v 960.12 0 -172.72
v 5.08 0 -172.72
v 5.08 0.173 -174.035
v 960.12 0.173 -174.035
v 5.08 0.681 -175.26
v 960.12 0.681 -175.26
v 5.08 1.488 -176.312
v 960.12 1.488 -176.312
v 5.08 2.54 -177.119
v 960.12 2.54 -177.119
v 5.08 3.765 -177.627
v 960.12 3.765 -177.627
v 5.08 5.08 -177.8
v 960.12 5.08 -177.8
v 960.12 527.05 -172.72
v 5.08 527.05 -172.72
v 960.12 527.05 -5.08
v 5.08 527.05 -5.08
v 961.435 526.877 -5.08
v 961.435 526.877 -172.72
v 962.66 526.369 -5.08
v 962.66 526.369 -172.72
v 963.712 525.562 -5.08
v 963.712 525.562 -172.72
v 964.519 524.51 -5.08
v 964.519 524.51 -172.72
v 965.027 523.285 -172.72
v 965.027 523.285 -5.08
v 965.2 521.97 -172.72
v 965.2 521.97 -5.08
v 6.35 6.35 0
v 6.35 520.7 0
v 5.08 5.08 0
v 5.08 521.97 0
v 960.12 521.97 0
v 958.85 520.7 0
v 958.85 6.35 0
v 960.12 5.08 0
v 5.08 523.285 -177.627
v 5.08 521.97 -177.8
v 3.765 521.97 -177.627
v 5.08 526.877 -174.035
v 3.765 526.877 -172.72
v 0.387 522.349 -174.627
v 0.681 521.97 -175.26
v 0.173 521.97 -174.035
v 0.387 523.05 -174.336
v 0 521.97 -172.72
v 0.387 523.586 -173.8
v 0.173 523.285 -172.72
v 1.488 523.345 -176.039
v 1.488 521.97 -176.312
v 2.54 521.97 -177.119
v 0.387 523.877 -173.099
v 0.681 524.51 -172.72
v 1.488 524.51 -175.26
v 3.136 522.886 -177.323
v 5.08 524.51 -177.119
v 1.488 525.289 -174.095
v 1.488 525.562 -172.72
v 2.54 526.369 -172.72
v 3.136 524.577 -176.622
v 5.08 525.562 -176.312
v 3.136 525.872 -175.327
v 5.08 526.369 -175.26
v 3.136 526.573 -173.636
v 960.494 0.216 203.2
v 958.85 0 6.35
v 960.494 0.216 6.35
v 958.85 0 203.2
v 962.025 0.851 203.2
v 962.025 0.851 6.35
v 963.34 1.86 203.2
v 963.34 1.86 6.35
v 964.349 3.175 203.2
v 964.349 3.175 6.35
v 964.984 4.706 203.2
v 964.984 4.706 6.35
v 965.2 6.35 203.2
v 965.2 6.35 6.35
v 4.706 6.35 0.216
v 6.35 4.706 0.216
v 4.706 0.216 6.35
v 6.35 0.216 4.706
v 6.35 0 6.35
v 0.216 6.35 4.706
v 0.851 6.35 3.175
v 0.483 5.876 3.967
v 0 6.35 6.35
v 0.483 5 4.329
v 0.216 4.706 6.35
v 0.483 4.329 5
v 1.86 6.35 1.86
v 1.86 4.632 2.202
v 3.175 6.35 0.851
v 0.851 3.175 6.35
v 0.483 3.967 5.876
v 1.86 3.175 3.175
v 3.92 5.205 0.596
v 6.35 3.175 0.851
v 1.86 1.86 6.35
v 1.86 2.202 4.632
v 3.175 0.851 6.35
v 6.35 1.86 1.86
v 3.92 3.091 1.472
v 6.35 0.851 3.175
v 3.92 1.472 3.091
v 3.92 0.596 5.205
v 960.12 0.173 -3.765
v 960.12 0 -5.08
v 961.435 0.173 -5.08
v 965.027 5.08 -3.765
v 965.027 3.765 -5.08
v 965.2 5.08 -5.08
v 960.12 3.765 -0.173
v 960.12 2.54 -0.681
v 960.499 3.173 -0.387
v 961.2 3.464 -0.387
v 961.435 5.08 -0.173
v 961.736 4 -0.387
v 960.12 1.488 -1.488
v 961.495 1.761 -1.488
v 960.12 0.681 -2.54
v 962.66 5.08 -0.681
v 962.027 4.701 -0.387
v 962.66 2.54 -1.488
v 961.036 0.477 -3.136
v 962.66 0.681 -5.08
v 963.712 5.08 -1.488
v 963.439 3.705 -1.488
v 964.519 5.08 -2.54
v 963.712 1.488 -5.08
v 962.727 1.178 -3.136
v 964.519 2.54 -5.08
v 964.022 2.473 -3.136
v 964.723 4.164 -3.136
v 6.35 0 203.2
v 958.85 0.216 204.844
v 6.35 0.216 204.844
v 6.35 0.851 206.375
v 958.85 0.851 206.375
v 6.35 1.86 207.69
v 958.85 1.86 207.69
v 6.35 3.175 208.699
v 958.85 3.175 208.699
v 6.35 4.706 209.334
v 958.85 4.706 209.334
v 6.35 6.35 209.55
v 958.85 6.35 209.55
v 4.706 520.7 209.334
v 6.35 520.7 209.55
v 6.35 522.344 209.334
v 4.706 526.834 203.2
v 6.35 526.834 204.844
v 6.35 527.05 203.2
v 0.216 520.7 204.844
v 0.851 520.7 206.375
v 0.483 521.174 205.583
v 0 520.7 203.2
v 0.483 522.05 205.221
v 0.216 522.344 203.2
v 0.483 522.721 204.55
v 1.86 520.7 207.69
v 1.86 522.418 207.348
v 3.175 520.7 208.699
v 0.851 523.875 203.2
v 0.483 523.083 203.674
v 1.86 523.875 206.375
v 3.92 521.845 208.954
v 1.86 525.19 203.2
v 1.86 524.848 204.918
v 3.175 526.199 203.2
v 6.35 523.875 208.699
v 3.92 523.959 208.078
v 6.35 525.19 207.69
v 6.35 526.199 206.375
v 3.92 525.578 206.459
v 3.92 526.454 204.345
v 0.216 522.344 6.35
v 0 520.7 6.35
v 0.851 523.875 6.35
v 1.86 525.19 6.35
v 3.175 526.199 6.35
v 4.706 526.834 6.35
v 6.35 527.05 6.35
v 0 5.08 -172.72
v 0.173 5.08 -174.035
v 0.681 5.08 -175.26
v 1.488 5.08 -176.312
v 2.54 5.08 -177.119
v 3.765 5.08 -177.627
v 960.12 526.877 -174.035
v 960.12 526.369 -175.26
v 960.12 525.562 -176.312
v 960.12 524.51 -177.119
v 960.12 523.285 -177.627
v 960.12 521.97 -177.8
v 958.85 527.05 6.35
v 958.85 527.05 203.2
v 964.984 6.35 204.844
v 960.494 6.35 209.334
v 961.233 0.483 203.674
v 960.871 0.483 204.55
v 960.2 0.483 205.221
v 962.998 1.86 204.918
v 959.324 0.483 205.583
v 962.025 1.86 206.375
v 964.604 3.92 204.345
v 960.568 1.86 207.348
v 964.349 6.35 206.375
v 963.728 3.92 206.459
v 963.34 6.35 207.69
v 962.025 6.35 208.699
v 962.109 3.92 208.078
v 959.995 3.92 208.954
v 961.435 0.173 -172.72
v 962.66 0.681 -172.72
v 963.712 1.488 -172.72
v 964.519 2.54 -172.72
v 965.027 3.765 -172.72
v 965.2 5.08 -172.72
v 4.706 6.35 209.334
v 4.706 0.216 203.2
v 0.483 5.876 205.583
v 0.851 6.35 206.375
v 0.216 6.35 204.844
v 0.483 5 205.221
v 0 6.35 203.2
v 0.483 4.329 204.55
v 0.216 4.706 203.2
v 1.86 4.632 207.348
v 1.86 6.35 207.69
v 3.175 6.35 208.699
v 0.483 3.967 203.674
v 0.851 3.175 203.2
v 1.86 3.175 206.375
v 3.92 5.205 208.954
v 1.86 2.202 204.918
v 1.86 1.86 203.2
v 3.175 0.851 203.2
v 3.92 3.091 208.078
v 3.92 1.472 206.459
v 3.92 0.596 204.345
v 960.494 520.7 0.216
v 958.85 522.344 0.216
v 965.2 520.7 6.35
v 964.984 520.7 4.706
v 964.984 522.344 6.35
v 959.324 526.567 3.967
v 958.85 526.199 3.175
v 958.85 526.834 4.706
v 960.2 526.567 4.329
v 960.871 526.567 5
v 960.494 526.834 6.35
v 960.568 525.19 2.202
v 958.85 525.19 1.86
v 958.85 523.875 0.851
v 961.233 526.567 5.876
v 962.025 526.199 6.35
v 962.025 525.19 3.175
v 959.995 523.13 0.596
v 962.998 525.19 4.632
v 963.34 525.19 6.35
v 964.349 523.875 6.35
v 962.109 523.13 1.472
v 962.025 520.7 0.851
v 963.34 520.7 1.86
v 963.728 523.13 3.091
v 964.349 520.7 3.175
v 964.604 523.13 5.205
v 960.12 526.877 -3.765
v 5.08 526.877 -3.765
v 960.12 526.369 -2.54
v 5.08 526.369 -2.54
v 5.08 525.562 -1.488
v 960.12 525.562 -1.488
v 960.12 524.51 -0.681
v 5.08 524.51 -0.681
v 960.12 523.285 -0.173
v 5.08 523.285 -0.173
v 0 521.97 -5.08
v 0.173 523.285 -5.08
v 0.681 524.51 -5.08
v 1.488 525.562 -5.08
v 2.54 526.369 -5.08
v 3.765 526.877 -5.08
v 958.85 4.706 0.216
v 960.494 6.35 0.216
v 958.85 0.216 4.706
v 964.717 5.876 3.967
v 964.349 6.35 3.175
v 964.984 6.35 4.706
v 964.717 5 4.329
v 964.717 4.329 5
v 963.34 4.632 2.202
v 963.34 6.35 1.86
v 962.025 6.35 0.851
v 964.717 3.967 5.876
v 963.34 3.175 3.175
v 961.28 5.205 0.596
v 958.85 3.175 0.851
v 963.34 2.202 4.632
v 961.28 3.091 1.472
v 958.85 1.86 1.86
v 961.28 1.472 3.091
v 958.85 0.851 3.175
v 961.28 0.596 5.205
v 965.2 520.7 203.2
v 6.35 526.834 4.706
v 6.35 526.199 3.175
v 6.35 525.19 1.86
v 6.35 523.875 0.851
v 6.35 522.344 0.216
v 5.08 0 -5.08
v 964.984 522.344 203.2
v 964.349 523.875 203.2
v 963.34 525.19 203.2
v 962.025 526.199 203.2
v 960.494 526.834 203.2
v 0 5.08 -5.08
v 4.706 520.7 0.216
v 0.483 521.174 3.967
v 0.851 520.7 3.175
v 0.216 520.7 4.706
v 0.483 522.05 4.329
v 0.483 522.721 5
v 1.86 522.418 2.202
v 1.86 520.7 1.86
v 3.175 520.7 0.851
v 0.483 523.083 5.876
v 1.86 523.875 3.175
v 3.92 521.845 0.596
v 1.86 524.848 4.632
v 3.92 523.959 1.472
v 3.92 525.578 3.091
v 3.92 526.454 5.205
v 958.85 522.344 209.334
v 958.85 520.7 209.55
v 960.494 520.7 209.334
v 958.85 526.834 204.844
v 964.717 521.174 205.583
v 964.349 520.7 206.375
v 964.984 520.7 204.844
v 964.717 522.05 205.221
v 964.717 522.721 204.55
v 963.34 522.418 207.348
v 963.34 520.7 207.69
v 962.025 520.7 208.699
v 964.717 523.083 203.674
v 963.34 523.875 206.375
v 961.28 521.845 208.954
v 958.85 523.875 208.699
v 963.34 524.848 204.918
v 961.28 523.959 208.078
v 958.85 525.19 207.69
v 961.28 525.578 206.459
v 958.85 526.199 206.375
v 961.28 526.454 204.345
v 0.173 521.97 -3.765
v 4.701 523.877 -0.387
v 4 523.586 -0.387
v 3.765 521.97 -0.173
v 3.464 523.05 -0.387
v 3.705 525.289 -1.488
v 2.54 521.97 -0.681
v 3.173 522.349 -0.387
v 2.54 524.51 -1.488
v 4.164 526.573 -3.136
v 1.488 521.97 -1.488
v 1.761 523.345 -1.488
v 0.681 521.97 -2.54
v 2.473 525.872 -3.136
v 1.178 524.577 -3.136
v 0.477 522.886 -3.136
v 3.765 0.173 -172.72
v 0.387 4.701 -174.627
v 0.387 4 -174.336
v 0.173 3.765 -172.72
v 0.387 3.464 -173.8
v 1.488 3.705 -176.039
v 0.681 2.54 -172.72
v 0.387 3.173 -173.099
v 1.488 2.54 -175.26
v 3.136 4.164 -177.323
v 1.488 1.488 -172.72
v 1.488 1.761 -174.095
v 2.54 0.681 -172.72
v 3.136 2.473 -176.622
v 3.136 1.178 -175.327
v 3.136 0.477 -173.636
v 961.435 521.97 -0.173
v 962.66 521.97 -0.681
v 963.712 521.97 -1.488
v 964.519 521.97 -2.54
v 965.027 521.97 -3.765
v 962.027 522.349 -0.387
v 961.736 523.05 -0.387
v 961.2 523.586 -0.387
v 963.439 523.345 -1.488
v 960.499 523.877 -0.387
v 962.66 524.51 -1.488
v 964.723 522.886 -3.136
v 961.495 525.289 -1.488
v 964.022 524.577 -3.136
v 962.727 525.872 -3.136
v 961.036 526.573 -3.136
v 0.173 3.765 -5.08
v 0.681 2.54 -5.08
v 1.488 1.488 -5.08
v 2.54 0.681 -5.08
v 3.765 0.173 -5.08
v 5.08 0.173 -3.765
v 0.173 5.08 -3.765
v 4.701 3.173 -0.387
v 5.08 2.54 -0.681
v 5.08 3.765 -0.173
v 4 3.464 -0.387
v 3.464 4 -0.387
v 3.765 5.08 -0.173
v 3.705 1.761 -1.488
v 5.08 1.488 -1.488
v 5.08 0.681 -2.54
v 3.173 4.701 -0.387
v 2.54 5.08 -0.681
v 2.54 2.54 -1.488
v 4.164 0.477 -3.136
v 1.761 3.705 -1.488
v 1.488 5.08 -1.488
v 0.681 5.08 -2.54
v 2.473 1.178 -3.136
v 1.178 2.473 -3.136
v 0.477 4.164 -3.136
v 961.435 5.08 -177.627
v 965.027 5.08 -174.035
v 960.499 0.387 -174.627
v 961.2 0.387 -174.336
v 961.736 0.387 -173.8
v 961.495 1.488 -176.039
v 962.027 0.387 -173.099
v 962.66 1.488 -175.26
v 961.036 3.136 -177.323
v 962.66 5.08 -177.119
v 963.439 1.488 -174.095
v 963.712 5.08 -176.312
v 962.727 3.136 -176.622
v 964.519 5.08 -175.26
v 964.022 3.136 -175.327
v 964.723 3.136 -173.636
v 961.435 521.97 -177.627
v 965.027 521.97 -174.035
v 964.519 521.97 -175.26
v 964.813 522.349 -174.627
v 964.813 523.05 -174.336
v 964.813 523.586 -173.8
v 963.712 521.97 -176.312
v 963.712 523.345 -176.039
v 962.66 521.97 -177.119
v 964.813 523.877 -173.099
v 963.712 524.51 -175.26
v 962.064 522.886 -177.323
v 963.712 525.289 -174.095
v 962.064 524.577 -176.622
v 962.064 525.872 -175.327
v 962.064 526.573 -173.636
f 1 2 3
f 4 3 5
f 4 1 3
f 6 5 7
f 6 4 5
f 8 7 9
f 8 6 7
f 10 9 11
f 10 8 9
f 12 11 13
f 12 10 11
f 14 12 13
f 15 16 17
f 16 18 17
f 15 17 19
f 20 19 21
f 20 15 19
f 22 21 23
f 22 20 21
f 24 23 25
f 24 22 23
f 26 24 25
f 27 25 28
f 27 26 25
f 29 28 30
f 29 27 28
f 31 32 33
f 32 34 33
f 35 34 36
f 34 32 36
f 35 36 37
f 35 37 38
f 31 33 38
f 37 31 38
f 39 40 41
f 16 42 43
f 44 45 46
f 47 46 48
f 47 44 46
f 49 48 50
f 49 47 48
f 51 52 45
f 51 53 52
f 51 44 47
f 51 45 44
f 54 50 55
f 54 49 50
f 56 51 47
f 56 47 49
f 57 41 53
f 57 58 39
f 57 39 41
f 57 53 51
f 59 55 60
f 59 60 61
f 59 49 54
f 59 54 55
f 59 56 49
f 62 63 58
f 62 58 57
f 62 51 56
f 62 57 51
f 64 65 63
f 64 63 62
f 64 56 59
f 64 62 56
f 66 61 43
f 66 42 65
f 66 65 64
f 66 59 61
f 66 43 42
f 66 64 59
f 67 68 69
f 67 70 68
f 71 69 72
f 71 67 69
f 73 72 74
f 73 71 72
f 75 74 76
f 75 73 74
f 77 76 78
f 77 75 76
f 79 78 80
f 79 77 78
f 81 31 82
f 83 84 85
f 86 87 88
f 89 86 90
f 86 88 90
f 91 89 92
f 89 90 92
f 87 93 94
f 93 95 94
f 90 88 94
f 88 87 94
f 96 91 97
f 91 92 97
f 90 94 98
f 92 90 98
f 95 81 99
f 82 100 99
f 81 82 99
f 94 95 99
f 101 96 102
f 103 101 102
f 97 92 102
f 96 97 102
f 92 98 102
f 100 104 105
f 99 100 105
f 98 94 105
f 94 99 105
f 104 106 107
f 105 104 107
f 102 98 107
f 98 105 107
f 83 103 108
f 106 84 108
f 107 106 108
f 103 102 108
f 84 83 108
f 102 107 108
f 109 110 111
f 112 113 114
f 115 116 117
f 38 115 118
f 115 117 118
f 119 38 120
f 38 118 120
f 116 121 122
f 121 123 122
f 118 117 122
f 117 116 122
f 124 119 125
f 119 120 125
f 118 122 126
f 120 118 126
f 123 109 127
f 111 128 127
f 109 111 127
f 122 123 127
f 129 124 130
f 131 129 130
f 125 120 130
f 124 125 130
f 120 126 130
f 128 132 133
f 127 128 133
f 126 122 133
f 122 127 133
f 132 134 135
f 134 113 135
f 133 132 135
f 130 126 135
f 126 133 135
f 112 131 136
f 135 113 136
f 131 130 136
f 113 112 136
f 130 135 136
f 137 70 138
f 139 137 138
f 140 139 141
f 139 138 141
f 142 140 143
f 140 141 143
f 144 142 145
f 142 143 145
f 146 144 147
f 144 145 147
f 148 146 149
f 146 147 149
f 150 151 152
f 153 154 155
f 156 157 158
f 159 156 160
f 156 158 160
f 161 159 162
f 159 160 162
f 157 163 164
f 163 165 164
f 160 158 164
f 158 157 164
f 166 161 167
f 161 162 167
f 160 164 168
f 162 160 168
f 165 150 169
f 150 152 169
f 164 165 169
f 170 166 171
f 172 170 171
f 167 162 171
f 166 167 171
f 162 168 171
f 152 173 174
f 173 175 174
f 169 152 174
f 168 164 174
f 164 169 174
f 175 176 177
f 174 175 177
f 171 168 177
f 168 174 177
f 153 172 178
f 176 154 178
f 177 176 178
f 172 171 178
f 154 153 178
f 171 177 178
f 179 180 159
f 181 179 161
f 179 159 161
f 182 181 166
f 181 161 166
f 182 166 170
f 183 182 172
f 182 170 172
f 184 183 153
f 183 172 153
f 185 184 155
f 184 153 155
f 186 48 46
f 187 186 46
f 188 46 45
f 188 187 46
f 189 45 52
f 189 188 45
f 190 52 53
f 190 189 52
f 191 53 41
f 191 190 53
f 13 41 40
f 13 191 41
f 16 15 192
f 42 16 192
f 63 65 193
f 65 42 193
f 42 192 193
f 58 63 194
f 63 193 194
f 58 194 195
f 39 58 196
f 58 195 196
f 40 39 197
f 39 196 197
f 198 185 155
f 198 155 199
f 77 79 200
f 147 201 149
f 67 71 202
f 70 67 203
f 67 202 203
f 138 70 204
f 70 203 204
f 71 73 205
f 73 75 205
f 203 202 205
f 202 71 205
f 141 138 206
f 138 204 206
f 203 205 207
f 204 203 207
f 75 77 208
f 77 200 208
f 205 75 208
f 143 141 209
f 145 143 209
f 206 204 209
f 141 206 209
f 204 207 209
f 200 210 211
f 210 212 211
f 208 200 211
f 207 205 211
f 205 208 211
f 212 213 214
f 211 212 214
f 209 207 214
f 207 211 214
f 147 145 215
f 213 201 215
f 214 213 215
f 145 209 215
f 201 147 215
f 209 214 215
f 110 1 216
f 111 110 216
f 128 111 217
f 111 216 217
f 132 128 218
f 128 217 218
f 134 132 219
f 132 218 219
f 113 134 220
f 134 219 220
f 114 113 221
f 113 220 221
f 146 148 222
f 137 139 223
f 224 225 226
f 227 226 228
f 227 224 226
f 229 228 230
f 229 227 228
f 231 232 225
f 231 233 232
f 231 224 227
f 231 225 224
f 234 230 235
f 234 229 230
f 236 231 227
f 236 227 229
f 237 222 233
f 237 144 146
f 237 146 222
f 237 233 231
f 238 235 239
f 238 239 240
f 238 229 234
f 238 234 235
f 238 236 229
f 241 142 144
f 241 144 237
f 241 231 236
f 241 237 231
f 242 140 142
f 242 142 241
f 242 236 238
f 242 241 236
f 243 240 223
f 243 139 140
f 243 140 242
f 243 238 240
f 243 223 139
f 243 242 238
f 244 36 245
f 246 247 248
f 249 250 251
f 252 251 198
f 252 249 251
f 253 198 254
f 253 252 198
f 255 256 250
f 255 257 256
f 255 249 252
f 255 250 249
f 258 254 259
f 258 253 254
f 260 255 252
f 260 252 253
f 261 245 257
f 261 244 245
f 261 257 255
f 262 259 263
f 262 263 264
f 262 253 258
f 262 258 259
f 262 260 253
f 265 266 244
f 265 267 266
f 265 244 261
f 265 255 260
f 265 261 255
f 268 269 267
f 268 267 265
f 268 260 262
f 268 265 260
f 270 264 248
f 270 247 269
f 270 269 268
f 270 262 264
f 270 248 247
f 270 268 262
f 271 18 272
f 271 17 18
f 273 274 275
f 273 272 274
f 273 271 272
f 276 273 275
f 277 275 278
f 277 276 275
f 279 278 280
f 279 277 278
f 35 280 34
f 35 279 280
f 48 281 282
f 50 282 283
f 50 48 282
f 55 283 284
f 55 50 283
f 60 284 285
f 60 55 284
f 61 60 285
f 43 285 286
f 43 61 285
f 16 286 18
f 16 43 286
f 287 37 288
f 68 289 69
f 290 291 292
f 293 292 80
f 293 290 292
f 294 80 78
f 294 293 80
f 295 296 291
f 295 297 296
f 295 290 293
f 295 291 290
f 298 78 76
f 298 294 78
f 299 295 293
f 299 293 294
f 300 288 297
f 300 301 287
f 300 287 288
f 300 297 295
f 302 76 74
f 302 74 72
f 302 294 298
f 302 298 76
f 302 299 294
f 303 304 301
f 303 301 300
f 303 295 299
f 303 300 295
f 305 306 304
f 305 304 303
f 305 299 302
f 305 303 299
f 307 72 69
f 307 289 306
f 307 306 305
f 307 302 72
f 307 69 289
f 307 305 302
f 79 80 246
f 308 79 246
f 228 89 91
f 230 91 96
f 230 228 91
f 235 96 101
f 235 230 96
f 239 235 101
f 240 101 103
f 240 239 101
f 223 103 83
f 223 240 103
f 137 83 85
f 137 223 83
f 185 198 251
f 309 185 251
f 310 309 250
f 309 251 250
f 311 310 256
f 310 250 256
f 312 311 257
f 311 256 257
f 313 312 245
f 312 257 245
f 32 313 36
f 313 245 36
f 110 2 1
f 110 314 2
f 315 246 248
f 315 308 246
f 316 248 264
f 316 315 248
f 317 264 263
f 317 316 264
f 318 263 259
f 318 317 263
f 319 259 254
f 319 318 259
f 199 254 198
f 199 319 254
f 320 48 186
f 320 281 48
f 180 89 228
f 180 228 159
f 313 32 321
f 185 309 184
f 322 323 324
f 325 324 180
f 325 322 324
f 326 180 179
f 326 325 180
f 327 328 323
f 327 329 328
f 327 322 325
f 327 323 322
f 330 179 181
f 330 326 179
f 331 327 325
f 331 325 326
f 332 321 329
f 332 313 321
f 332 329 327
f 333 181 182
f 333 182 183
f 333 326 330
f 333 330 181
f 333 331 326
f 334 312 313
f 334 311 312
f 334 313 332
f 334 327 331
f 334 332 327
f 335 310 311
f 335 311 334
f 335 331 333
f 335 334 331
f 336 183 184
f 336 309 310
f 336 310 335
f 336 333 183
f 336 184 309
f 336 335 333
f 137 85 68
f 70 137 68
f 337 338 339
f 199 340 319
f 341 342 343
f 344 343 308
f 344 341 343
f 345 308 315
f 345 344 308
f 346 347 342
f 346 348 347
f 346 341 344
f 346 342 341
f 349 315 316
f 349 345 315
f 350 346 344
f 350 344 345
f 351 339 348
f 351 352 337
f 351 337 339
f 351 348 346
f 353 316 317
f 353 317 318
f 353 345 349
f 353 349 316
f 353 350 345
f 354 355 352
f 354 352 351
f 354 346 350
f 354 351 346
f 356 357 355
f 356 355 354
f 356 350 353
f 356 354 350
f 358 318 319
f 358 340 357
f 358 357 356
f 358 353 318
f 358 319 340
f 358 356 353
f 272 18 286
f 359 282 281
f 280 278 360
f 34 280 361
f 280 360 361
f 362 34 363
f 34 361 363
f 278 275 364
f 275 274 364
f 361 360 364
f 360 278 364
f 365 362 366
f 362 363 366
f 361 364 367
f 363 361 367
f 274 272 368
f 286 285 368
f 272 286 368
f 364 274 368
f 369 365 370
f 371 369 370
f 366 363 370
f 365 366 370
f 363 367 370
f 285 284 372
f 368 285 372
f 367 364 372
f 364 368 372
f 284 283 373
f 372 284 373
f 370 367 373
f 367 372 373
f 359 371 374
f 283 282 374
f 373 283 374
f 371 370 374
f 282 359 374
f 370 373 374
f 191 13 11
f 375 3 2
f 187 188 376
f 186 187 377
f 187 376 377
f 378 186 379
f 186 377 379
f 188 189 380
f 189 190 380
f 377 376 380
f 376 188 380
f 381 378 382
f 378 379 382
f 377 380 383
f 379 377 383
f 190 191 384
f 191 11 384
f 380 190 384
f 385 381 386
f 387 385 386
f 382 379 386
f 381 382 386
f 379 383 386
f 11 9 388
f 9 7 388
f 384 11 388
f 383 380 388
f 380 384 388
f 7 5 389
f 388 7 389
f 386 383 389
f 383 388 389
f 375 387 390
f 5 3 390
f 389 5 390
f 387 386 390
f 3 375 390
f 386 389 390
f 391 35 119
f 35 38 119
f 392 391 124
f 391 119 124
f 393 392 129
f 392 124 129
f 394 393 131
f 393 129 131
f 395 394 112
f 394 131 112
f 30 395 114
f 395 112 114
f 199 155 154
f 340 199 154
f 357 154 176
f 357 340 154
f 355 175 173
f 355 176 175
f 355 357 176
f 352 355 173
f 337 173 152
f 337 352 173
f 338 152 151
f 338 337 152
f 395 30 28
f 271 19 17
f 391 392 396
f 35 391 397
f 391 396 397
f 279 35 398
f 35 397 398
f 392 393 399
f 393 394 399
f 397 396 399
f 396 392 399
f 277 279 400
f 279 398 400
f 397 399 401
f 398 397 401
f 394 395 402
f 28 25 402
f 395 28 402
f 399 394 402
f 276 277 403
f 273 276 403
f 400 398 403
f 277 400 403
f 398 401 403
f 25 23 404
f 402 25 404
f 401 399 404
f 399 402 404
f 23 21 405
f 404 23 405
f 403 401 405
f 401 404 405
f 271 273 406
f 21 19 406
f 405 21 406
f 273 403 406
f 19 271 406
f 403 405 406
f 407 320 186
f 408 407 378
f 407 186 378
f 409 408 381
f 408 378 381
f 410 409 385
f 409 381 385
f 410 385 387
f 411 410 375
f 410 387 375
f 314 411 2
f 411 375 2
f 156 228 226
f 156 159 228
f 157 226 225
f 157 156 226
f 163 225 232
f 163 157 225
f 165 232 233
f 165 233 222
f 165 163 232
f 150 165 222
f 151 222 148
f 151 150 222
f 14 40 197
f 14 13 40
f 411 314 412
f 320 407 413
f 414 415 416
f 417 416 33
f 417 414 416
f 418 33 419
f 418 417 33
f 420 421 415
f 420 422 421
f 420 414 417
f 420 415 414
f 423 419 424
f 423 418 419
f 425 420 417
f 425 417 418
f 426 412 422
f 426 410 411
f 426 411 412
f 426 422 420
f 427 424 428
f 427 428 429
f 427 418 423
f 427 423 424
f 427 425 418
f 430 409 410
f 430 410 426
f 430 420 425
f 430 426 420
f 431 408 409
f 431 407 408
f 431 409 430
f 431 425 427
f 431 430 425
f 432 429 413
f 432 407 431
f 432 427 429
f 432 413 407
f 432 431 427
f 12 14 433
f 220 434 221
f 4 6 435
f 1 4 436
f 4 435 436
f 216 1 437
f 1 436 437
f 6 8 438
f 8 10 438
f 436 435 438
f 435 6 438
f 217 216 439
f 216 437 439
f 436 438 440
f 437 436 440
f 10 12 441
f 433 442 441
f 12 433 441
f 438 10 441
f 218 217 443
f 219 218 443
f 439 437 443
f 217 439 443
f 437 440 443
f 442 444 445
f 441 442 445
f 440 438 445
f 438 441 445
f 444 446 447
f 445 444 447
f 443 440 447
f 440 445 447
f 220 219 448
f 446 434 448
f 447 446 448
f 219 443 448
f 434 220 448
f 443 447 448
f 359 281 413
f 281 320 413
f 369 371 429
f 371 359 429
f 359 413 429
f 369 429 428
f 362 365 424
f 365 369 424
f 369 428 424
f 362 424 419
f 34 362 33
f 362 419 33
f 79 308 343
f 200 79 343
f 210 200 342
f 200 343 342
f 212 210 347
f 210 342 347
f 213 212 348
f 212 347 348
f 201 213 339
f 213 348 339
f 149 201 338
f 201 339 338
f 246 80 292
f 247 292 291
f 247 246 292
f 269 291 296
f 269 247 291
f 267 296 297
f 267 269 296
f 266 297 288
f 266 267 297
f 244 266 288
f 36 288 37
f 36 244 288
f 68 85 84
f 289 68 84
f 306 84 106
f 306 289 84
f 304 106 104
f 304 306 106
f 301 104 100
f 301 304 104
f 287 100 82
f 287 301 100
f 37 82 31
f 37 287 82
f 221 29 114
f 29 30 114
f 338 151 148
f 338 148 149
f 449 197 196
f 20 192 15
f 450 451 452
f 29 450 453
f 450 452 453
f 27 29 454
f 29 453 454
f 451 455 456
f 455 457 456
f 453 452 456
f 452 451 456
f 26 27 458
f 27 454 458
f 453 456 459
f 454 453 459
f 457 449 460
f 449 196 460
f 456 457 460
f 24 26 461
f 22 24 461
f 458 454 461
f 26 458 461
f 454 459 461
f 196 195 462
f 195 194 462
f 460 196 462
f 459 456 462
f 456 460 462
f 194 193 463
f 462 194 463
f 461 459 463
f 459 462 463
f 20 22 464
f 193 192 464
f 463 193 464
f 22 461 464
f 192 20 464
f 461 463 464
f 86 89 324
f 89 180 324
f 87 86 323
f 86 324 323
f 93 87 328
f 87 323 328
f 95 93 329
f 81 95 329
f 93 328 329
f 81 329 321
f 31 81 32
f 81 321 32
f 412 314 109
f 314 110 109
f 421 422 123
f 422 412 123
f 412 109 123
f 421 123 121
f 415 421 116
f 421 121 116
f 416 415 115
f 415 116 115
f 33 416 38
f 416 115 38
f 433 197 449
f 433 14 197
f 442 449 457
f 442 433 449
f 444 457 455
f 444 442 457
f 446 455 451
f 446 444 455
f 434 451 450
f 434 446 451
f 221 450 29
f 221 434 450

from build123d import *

# Parameters (mm, degrees)
F0_W     = 965.2
F0_H     = 527.05
F1_DEPTH = 209.55
F2_R     = 6.35
F3_W     = 965.2
F3_H     = 527.05
F4_DEPTH = 177.8
F5_R     = 5.08


with BuildPart() as f1:
    # F0 (on Top) → F1 (new body)
    with BuildSketch(Plane.XY):
        with Locations((482.6, 263.525)):
            Rectangle(F0_W, F0_H)
    extrude(amount=F1_DEPTH)

    # F2
    f2_edges = [f1.edges().sort_by_distance(p)[0] for p in [
        (482.6, 0, 0),
        (965.2, 263.525, 0),
        (482.6, 527.05, 0),
        (0, 263.525, 0),
        (482.6, 527.05, 209.55),
        (965.2, 263.525, 209.55),
        (965.2, 527.05, 104.775),
        (965.2, 0, 104.775),
        (482.6, 0, 209.55),
        (0, 263.525, 209.55),
        (0, 0, 104.775),
        (0, 527.05, 104.775),
    ]]
    fillet(f2_edges, radius=F2_R)

    # F3 (on face) → F4 (join)
    with BuildSketch(Plane(origin=(0, 0, 0), x_dir=(1, 0, 0), z_dir=(0, 0, -1))):
        with Locations((482.6, -263.525)):
            Rectangle(F3_W, F3_H)
    extrude(amount=F4_DEPTH)

    # F5
    f5_edges = [f1.edges().sort_by_distance(p)[0] for p in [
        (482.6, 527.05, -177.8),
        (965.2, 263.525, -177.8),
        (482.6, 0, -177.8),
        (0, 263.525, -177.8),
        (965.2, 0, -88.9),
        (0, 0, -88.9),
        (482.6, 0, 0),
        (965.2, 527.05, -88.9),
        (965.2, 263.525, 0),
        (0, 527.05, -88.9),
        (482.6, 527.05, 0),
        (0, 263.525, 0),
    ]]
    fillet(f5_edges, radius=F5_R)


solid = f1.part
